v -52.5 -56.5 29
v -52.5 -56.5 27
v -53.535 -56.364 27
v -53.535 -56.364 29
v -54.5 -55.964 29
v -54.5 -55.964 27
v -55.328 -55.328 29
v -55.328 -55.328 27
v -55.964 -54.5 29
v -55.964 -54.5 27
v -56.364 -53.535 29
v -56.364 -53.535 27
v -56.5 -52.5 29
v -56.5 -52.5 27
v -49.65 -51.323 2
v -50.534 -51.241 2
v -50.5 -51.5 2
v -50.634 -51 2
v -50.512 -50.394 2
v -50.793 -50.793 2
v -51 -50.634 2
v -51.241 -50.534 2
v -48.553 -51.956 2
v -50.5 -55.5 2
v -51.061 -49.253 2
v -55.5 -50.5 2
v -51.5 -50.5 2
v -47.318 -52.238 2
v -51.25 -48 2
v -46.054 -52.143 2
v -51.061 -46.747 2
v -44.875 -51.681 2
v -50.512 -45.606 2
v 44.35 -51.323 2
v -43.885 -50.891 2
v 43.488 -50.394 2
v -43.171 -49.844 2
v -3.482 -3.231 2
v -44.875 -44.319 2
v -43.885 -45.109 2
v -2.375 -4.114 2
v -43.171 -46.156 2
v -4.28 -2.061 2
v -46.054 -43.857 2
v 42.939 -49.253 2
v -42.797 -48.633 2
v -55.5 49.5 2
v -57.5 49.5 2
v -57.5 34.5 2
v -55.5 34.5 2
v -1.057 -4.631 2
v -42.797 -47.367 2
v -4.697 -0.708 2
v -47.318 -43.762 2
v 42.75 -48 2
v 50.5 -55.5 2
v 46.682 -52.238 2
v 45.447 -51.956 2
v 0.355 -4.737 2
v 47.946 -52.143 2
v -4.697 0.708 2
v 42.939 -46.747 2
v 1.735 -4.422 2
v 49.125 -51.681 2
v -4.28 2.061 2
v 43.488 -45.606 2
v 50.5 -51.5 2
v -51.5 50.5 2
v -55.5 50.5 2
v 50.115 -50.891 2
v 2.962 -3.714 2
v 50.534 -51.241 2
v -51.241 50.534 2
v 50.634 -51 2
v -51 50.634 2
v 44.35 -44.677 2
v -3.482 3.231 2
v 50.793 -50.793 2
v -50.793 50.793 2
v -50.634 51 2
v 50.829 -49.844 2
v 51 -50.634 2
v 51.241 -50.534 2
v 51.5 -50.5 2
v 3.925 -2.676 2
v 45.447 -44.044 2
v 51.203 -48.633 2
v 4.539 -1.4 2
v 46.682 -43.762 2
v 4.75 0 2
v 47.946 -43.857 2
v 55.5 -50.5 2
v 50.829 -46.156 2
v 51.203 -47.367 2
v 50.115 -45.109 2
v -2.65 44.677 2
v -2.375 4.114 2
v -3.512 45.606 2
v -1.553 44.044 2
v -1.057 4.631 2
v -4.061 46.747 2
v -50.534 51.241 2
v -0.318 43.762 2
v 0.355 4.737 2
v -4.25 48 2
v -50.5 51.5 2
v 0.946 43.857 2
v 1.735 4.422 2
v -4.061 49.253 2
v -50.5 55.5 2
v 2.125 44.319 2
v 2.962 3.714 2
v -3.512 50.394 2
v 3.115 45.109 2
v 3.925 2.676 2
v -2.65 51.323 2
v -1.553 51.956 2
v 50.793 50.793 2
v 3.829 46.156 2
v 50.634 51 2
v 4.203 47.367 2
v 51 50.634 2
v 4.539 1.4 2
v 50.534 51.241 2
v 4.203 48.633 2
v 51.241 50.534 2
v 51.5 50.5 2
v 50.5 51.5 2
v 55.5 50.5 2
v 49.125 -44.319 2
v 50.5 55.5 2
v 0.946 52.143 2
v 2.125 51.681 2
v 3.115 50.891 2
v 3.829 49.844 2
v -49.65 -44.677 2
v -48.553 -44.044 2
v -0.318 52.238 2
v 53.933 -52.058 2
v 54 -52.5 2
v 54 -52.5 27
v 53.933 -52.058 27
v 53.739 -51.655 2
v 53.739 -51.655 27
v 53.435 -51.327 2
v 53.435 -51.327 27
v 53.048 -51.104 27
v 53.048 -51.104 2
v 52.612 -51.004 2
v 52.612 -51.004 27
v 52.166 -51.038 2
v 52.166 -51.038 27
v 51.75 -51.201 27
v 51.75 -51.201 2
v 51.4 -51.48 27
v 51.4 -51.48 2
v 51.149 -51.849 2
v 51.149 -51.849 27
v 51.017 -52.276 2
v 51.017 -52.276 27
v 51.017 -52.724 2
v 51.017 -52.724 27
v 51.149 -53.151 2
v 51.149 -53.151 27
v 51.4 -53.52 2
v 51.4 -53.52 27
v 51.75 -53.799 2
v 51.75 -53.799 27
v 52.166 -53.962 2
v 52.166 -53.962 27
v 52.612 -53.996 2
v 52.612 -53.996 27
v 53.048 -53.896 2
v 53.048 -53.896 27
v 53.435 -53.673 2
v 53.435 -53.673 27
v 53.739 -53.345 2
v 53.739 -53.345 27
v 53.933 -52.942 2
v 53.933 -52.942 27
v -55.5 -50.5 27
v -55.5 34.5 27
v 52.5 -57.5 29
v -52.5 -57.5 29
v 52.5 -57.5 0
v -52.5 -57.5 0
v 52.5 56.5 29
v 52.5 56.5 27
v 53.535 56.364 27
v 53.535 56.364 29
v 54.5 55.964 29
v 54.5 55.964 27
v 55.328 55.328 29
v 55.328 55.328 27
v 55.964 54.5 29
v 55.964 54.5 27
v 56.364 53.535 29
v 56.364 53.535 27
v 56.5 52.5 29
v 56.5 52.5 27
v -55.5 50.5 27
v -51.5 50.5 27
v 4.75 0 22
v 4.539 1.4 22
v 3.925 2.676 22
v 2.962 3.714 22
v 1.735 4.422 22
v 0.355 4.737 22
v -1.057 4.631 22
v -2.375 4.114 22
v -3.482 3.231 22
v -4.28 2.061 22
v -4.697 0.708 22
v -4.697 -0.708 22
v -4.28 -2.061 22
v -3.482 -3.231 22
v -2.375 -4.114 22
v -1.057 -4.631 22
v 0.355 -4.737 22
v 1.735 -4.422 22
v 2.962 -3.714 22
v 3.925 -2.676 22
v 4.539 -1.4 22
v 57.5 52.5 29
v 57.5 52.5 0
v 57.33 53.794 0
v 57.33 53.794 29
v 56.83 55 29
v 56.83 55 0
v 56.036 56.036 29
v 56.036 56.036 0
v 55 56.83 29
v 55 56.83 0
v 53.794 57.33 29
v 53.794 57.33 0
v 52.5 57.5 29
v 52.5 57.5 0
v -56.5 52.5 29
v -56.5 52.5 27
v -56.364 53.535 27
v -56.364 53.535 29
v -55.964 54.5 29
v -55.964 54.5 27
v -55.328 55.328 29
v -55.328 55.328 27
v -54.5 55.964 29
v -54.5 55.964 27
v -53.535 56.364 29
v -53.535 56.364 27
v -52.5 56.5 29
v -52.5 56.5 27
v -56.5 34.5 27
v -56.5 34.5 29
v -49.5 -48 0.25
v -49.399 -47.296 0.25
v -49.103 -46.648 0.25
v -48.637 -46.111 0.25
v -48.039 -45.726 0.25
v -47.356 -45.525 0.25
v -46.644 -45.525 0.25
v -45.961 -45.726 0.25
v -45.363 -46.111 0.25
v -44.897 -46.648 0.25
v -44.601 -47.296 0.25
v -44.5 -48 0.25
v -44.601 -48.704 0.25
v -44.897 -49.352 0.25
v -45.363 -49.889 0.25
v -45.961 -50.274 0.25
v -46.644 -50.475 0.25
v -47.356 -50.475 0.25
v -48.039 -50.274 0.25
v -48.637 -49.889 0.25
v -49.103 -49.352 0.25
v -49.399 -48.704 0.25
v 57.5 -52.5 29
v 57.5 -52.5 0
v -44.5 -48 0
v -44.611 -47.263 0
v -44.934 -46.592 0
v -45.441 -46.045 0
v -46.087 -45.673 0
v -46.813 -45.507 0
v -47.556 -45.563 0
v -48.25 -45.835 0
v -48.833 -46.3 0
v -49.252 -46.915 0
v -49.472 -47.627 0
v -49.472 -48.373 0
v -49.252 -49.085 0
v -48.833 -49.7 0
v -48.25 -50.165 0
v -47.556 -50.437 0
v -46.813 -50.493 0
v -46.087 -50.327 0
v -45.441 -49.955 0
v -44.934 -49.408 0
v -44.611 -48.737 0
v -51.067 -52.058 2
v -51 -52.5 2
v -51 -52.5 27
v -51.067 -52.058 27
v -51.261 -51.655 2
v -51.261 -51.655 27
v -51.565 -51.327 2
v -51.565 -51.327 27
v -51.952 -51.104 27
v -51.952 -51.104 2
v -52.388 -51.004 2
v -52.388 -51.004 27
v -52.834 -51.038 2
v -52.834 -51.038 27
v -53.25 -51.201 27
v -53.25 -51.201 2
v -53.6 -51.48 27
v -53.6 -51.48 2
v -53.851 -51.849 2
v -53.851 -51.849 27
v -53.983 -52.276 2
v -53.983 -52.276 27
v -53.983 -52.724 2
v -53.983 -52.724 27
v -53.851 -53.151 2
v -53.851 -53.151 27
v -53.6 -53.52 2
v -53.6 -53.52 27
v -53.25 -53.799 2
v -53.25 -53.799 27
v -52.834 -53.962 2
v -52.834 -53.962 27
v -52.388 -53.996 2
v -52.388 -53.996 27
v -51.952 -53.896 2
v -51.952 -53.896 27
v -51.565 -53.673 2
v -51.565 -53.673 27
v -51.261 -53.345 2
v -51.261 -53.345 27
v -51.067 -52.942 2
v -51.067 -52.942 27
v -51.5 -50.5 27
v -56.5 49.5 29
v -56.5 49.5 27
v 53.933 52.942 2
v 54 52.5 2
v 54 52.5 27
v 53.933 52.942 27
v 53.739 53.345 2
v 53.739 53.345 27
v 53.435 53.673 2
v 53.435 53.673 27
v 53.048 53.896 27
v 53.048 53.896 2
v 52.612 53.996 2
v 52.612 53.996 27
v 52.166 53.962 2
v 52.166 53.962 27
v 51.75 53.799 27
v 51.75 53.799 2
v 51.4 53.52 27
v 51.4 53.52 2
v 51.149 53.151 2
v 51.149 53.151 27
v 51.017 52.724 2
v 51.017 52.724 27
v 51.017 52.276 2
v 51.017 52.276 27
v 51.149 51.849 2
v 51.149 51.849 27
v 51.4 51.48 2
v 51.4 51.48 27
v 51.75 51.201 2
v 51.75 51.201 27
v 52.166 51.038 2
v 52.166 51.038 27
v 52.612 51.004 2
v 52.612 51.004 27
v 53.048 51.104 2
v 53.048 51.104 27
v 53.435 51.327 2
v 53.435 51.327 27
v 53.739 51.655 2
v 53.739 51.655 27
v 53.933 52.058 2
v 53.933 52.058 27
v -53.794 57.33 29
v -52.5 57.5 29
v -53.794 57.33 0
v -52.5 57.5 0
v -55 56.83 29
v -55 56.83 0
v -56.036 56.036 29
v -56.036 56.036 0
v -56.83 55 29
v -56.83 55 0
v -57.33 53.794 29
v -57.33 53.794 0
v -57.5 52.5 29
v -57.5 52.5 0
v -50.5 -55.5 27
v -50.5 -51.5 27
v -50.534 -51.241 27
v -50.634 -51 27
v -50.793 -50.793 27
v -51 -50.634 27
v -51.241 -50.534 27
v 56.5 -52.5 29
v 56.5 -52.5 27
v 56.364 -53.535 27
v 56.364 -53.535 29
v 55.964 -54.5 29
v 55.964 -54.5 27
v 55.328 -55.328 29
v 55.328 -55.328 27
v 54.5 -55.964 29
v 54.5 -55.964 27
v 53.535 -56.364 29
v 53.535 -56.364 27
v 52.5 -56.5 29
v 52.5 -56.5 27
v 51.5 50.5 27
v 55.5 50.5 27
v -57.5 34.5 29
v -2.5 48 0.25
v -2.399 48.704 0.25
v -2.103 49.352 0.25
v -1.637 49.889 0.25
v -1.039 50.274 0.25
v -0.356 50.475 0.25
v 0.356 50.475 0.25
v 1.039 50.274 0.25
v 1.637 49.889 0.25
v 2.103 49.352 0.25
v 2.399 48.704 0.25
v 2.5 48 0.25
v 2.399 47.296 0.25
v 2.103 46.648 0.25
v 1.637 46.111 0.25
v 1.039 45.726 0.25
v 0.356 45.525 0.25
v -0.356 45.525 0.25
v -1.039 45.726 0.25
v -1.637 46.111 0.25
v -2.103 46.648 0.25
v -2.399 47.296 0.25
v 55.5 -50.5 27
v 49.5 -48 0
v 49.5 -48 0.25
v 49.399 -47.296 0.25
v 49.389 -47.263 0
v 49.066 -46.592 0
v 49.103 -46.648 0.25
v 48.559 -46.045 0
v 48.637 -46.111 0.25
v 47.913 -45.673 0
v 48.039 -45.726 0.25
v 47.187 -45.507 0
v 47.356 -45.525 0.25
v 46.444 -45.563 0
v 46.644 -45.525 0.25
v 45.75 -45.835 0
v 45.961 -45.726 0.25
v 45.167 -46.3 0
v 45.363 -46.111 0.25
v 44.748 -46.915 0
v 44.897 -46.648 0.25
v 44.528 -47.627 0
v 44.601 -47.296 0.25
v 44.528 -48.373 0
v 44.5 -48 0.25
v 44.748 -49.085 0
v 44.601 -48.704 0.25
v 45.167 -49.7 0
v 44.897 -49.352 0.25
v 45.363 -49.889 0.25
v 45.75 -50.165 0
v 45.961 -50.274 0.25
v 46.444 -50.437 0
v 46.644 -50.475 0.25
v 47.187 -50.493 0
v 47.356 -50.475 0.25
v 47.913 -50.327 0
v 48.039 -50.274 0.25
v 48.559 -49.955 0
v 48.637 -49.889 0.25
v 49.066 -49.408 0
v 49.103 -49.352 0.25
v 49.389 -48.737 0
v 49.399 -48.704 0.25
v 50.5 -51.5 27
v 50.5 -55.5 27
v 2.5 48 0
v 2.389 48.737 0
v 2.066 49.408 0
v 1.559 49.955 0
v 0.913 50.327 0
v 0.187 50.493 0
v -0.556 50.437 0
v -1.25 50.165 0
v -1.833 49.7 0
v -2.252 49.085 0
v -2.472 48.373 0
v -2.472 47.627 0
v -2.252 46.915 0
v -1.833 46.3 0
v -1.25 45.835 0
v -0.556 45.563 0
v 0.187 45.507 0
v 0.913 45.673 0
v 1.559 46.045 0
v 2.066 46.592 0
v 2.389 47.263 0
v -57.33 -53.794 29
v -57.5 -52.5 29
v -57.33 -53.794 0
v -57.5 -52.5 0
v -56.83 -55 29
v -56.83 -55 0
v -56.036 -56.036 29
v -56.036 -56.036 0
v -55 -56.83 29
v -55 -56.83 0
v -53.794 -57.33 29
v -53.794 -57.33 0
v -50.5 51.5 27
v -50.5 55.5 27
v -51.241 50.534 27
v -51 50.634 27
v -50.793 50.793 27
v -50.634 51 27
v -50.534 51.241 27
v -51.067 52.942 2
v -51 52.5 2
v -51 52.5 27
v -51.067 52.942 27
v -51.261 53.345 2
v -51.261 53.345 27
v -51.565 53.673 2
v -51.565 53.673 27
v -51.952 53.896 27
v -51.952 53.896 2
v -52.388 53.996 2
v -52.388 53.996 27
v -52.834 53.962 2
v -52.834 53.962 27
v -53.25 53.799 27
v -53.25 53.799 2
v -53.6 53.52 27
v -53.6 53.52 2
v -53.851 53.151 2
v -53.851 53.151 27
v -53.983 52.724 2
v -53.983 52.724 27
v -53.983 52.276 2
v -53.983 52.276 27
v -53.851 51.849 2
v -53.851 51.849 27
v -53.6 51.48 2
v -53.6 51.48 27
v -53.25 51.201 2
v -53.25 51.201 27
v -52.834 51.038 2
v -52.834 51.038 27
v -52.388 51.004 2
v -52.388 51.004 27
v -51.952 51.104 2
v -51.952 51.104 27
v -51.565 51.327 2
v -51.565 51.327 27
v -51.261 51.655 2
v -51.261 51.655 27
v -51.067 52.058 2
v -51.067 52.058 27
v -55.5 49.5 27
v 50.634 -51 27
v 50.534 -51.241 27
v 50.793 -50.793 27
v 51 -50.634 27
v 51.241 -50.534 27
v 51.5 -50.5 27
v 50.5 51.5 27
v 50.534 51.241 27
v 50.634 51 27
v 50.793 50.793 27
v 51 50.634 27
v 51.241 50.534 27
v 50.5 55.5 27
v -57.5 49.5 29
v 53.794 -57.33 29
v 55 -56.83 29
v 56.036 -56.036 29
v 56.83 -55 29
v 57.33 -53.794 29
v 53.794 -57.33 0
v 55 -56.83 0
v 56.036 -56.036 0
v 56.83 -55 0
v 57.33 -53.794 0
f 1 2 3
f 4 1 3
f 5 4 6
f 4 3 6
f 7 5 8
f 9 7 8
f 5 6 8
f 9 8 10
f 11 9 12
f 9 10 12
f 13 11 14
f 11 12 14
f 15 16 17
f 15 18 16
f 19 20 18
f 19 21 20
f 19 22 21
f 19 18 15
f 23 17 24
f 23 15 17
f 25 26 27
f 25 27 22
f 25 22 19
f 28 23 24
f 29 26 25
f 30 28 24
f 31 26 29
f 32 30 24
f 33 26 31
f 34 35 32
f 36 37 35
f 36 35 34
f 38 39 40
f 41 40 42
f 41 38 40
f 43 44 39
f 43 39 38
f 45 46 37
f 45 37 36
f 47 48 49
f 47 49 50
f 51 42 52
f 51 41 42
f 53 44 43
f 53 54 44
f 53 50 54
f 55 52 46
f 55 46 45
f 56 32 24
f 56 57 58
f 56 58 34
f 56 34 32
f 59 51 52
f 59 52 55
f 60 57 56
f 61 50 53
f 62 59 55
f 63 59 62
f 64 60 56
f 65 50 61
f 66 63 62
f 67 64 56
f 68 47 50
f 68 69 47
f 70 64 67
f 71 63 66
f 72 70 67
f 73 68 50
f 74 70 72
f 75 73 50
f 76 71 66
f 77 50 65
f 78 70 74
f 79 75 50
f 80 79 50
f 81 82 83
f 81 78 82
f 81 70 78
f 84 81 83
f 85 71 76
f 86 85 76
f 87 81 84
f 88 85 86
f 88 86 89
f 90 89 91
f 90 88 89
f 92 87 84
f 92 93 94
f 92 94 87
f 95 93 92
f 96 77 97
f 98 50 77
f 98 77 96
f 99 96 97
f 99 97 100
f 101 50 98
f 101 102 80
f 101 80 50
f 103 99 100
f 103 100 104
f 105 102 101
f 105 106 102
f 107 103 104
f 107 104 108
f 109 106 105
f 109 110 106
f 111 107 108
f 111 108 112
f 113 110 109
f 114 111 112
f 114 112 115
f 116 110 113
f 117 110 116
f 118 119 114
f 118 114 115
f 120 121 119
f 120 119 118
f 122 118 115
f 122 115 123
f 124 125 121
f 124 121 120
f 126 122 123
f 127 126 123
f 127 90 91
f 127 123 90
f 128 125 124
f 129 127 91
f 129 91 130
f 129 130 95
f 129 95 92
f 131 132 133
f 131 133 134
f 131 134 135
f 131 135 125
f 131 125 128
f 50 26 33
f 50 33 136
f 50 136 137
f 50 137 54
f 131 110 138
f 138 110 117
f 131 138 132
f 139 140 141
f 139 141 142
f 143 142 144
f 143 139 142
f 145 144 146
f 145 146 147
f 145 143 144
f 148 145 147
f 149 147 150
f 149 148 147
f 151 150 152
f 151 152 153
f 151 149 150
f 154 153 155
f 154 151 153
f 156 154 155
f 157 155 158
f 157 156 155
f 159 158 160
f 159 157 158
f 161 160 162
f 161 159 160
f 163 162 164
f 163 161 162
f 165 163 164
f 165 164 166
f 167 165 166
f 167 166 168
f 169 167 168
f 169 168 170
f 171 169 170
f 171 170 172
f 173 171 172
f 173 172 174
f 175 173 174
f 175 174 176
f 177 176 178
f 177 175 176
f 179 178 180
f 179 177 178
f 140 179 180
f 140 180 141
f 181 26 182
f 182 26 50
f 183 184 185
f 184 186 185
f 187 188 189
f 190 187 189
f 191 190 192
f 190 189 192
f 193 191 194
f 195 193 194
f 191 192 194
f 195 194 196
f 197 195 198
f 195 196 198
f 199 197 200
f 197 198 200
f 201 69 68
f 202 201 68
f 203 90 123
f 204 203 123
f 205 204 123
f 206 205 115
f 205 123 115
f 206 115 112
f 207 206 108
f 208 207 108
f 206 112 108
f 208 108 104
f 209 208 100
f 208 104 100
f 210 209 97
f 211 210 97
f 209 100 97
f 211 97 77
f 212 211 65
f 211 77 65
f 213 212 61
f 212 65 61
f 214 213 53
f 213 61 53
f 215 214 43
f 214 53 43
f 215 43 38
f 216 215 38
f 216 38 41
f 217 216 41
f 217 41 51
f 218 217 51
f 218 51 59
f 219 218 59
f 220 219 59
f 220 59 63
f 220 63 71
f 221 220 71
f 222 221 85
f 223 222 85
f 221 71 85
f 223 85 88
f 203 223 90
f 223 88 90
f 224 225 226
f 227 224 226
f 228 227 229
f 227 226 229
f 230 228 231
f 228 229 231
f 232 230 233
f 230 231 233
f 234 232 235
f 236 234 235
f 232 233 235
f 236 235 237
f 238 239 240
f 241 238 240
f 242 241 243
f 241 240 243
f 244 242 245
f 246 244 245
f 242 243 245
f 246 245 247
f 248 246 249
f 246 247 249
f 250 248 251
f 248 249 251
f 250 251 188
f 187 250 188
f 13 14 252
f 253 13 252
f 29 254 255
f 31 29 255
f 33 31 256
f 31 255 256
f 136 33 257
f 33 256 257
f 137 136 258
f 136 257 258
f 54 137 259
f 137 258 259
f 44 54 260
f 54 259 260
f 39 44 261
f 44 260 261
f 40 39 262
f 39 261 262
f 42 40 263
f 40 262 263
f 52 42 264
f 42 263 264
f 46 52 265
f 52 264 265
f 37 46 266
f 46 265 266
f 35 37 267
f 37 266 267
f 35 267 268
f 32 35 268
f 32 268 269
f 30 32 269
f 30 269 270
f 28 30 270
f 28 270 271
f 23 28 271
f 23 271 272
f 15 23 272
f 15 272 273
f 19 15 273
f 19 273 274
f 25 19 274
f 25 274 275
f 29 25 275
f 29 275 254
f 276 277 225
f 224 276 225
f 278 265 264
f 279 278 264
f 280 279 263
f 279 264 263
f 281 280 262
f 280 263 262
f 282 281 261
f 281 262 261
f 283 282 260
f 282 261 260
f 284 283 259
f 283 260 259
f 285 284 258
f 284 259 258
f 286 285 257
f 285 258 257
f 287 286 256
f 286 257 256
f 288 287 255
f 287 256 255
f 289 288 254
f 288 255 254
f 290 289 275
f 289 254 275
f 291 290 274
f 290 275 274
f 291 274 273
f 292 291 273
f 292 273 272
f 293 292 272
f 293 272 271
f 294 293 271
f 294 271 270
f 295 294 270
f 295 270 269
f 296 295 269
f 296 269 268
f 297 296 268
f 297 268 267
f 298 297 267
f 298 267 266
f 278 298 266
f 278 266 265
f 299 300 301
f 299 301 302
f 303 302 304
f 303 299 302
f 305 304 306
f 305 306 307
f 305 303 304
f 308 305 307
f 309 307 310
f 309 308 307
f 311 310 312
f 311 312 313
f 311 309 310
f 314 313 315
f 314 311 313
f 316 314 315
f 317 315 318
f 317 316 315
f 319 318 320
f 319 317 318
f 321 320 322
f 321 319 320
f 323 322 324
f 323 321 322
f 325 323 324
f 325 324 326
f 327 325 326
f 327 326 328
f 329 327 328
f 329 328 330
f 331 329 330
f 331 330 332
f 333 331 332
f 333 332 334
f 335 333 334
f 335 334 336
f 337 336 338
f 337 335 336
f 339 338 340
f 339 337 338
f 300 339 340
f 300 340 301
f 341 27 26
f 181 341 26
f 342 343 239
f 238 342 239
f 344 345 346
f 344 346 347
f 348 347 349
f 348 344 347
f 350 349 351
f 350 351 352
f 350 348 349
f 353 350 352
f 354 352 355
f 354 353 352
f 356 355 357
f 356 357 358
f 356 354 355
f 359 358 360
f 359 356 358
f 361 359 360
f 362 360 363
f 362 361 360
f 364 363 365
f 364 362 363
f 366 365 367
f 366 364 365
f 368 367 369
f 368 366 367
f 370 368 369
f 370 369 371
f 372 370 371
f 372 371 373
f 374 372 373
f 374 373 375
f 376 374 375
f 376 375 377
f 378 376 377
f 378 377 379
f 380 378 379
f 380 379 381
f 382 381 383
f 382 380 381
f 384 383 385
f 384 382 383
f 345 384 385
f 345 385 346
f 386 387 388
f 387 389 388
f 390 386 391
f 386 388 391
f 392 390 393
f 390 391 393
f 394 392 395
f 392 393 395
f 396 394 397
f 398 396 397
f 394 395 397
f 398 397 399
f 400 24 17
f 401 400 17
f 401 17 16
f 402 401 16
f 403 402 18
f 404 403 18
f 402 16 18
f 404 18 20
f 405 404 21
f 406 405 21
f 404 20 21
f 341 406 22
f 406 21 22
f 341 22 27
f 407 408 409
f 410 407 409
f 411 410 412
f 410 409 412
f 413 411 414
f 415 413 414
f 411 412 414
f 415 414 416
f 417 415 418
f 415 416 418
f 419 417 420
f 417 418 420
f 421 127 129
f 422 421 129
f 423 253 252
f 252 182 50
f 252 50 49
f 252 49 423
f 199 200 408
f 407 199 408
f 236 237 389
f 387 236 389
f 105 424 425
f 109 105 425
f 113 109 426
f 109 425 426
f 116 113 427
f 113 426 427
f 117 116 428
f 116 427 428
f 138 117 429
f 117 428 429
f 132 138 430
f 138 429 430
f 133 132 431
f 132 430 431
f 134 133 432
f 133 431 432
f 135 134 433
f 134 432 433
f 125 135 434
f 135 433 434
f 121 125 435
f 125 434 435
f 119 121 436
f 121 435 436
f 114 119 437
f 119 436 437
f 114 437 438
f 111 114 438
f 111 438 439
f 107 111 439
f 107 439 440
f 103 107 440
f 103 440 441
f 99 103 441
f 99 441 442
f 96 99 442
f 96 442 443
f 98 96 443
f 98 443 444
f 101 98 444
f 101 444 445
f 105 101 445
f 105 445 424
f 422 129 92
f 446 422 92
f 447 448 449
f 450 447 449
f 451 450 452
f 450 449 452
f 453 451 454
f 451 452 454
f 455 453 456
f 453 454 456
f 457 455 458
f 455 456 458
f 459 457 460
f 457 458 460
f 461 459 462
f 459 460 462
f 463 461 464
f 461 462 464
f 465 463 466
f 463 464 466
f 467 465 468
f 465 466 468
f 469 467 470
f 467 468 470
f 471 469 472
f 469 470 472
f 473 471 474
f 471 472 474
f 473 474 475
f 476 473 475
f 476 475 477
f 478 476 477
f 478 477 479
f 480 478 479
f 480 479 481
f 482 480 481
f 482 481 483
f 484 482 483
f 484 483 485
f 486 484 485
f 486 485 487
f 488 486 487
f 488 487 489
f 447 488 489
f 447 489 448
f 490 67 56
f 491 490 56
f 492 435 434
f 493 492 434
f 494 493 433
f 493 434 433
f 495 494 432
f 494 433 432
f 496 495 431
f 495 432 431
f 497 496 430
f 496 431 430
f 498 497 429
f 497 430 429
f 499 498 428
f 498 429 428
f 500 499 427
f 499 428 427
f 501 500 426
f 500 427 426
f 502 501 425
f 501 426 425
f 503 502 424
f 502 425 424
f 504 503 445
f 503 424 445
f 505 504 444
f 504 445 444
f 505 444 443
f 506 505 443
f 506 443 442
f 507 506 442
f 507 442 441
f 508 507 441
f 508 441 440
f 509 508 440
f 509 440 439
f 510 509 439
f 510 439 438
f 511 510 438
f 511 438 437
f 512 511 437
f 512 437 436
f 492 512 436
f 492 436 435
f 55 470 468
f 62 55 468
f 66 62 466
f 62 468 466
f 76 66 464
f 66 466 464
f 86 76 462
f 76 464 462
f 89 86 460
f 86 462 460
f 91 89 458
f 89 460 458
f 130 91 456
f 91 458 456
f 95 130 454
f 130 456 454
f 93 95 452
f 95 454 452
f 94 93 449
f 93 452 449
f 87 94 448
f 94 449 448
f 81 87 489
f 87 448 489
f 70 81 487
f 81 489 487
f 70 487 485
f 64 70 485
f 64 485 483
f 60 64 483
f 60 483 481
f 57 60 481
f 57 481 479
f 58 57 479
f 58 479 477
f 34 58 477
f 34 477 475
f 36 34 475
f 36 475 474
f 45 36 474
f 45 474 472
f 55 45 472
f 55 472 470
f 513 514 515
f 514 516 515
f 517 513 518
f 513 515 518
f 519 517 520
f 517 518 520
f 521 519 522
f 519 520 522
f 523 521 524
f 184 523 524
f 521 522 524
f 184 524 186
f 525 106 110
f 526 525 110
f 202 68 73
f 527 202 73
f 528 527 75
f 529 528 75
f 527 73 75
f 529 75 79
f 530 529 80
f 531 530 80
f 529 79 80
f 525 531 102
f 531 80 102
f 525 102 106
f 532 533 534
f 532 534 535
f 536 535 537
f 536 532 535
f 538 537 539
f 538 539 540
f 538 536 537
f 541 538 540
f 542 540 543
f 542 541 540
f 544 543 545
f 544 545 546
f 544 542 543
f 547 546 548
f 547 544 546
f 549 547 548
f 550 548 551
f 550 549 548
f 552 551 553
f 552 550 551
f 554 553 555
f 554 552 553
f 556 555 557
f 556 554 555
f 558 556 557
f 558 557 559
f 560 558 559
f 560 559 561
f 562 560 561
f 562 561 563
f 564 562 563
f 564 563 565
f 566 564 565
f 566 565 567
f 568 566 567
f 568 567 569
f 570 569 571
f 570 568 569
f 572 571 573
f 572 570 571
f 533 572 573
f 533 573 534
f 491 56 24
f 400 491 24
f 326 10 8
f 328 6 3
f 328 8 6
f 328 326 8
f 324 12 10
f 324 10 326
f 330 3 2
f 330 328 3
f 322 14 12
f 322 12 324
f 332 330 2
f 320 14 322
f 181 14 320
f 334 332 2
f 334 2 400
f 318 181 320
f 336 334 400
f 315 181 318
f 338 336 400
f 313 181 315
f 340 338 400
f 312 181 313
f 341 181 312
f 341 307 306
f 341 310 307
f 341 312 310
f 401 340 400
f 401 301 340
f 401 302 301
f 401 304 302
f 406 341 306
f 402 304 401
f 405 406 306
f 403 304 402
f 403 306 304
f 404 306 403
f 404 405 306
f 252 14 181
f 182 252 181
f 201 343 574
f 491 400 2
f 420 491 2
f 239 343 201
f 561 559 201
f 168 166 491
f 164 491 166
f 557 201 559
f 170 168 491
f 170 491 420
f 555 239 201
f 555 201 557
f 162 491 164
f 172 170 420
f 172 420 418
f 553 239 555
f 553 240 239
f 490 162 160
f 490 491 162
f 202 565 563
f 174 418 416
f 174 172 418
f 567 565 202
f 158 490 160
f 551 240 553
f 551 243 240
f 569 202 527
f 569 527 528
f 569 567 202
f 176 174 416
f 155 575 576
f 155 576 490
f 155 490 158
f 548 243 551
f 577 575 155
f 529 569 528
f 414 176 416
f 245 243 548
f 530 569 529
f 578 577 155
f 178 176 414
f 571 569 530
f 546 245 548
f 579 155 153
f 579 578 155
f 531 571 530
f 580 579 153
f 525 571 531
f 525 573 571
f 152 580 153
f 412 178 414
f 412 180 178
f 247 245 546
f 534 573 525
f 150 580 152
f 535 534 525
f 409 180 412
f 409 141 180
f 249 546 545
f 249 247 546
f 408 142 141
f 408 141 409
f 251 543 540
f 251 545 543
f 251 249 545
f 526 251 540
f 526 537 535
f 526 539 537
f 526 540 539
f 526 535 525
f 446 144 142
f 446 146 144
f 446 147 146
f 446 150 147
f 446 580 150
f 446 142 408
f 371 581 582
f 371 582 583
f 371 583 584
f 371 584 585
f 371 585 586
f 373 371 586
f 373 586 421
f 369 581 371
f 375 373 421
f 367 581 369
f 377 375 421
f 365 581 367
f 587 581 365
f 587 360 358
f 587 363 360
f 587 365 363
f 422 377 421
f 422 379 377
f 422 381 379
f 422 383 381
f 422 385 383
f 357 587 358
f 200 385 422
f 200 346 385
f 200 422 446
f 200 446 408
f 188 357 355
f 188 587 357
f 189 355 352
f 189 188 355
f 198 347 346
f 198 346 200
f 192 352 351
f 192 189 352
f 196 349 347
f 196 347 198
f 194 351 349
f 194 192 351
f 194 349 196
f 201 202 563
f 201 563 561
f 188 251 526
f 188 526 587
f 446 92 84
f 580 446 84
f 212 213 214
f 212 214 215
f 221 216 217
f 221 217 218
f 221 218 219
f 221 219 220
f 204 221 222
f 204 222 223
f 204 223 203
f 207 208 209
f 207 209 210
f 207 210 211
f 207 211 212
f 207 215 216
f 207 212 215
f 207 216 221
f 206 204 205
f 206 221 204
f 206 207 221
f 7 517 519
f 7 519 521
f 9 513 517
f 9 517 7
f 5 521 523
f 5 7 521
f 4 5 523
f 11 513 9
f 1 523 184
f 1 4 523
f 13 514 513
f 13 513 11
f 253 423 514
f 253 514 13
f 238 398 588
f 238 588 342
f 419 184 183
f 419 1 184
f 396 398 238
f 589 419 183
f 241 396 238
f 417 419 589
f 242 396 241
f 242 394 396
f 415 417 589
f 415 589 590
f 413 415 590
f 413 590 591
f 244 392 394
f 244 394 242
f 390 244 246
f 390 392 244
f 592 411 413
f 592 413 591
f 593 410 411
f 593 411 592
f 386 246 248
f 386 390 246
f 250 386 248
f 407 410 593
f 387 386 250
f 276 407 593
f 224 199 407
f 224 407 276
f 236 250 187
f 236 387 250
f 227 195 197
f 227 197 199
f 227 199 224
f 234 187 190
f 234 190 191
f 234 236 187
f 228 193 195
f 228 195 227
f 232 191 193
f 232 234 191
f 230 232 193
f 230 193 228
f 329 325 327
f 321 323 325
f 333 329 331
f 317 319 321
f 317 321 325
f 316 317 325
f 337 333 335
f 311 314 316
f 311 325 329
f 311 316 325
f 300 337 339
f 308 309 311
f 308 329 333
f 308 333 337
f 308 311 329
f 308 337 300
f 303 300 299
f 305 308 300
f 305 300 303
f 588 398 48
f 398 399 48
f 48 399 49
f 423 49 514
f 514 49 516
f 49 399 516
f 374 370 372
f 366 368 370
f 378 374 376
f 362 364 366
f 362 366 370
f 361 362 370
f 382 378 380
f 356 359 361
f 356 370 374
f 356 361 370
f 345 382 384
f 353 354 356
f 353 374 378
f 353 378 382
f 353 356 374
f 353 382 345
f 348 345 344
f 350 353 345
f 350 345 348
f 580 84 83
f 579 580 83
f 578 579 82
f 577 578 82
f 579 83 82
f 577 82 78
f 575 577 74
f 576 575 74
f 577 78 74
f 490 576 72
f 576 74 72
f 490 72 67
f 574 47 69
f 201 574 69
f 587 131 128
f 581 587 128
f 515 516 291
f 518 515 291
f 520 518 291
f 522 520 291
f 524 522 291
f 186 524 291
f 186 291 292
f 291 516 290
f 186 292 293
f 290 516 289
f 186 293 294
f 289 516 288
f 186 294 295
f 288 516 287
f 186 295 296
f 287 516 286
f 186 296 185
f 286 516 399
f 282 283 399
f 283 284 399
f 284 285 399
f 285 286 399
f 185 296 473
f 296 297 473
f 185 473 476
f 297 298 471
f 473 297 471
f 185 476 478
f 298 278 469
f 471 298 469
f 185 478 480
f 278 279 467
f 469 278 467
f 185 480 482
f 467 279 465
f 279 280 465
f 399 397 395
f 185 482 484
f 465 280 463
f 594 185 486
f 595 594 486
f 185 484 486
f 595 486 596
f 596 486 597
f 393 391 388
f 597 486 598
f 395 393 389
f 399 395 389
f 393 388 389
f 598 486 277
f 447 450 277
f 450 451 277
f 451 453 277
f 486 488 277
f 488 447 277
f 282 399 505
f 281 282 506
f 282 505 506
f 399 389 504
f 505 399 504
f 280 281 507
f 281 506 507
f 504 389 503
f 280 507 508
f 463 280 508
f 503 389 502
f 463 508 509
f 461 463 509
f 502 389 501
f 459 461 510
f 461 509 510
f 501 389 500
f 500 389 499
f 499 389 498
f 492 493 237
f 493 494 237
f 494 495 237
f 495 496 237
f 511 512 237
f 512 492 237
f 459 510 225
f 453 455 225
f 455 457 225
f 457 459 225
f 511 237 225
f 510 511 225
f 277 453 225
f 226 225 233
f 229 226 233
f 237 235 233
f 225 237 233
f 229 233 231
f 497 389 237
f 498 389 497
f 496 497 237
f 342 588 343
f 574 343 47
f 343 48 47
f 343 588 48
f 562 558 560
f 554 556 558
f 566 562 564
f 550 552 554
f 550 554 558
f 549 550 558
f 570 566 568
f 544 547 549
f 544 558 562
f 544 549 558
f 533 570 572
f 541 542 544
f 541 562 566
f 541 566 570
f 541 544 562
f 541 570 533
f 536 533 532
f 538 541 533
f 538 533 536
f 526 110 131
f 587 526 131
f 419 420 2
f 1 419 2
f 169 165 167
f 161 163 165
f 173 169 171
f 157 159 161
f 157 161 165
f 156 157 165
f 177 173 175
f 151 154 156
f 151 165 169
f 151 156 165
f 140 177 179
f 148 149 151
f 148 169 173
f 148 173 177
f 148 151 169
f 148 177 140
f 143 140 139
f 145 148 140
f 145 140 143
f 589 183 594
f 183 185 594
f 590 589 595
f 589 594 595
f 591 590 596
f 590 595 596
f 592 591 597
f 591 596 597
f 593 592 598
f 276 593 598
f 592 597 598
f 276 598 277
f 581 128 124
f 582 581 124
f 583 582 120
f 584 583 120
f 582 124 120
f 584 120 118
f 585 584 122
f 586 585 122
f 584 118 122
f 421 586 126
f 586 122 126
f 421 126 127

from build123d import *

# Parameters (mm, degrees)
F1_DEPTH        = 2
F2_R            = 4.75
F3_DEPTH        = 20
F2_R_2          = 2.5
F4_DEPTH        = 2
F2_R_3          = 1.5
F5_DEPTH        = 25
F7_DEPTH        = 2
F8_D            = 5
F8_CSINK_D      = 8.5
F8_CSINK_ANGLE  = 90
F9_D            = 5
F9_CSINK_D      = 8.5
F9_CSINK_ANGLE  = 90
F10_D           = 5
F10_CSINK_D     = 8.5
F10_CSINK_ANGLE = 90


with BuildPart() as f1:
    # F0 (on Top) → F1 (new body)
    with BuildSketch(Plane.XY):
        with BuildLine():
            ThreePointArc((-57.5, -52.5), (-56.035534, -56.035534), (-52.5, -57.5))
            Line((-52.5, -57.5), (52.5, -57.5))
            ThreePointArc((52.5, -57.5), (56.035534, -56.035534), (57.5, -52.5))
            Line((57.5, -52.5), (57.5, 52.5))
            ThreePointArc((57.5, 52.5), (56.035534, 56.035534), (52.5, 57.5))
            Line((52.5, 57.5), (-52.5, 57.5))
            ThreePointArc((-52.5, 57.5), (-56.035534, 56.035534), (-57.5, 52.5))
            Line((-57.5, 52.5), (-57.5, -52.5))
        make_face()
    extrude(amount=F1_DEPTH)

    # F2 (on face) → F3 (join)
    with BuildSketch(Plane.XY.offset(2)):
        Circle(F2_R)
    extrude(amount=F3_DEPTH)

    # F2 (on face) → F4 (cut)
    with BuildSketch(Plane.XY.offset(2)):
        with Locations((47, -48)):
            Circle(F2_R_2)
        with Locations((0, 48)):
            Circle(F2_R_2)
        with Locations((-47, -48)):
            Circle(F2_R_2)
    extrude(amount=-F4_DEPTH, mode=Mode.SUBTRACT)

    # F2 (on face) → F5 (join)
    with BuildSketch(Plane.XY.offset(2)):
        with BuildLine():
            Line((-55.5, 49.5), (-55.5, 50.5))
            Line((-55.5, 50.5), (-51.5, 50.5))
            ThreePointArc((-51.5, 50.5), (-50.792893, 50.792893), (-50.5, 51.5))
            Line((-50.5, 51.5), (-50.5, 55.5))
            Line((-50.5, 55.5), (50.5, 55.5))
            Line((50.5, 55.5), (50.5, 51.5))
            ThreePointArc((50.5, 51.5), (50.792893, 50.792893), (51.5, 50.5))
            Line((51.5, 50.5), (55.5, 50.5))
            Line((55.5, 50.5), (55.5, -50.5))
            Line((55.5, -50.5), (51.5, -50.5))
            ThreePointArc((51.5, -50.5), (50.792893, -50.792893), (50.5, -51.5))
            Line((50.5, -51.5), (50.5, -55.5))
            Line((50.5, -55.5), (-50.5, -55.5))
            Line((-50.5, -55.5), (-50.5, -51.5))
            ThreePointArc((-50.5, -51.5), (-50.792893, -50.792893), (-51.5, -50.5))
            Line((-51.5, -50.5), (-55.5, -50.5))
            Line((-55.5, -50.5), (-55.5, 34.5))
            Line((-55.5, 34.5), (-57.5, 34.5))
            Line((-57.5, 34.5), (-57.5, -52.5))
            ThreePointArc((-57.5, -52.5), (-56.035534, -56.035534), (-52.5, -57.5))
            Line((-52.5, -57.5), (52.5, -57.5))
            ThreePointArc((52.5, -57.5), (56.035534, -56.035534), (57.5, -52.5))
            Line((57.5, -52.5), (57.5, 52.5))
            ThreePointArc((57.5, 52.5), (56.035534, 56.035534), (52.5, 57.5))
            Line((52.5, 57.5), (-52.5, 57.5))
            ThreePointArc((-52.5, 57.5), (-56.035534, 56.035534), (-57.5, 52.5))
            Line((-57.5, 52.5), (-57.5, 49.5))
            Line((-57.5, 49.5), (-55.5, 49.5))
        make_face()
        with Locations((-52.5, -52.5)):
            Circle(F2_R_3, mode=Mode.SUBTRACT)
        with Locations((52.5, -52.5)):
            Circle(F2_R_3, mode=Mode.SUBTRACT)
        with Locations((-52.5, 52.5)):
            Circle(F2_R_3, mode=Mode.SUBTRACT)
        with Locations((52.5, 52.5)):
            Circle(F2_R_3, mode=Mode.SUBTRACT)
    extrude(amount=F5_DEPTH)

    # F6 (on face) → F7 (join)
    with BuildSketch(Plane.XY.offset(27)):
        with BuildLine():
            Line((52.5, 57.5), (-52.5, 57.5))
            ThreePointArc((-52.5, 57.5), (-56.035534, 56.035534), (-57.5, 52.5))
            Line((-57.5, 52.5), (-57.5, 49.5))
            Line((-57.5, 49.5), (-56.5, 49.5))
            Line((-56.5, 49.5), (-56.5, 52.5))
            ThreePointArc((-56.5, 52.5), (-55.328427, 55.328427), (-52.5, 56.5))
            Line((-52.5, 56.5), (52.5, 56.5))
            ThreePointArc((52.5, 56.5), (55.328427, 55.328427), (56.5, 52.5))
            Line((56.5, 52.5), (56.5, -52.5))
            ThreePointArc((56.5, -52.5), (55.328427, -55.328427), (52.5, -56.5))
            Line((52.5, -56.5), (-52.5, -56.5))
            ThreePointArc((-52.5, -56.5), (-55.328427, -55.328427), (-56.5, -52.5))
            Line((-56.5, -52.5), (-56.5, 34.5))
            Line((-56.5, 34.5), (-57.5, 34.5))
            Line((-57.5, 34.5), (-57.5, -52.5))
            ThreePointArc((-57.5, -52.5), (-56.035534, -56.035534), (-52.5, -57.5))
            Line((-52.5, -57.5), (52.5, -57.5))
            ThreePointArc((52.5, -57.5), (56.035534, -56.035534), (57.5, -52.5))
            Line((57.5, -52.5), (57.5, 52.5))
            ThreePointArc((57.5, 52.5), (56.035534, 56.035534), (52.5, 57.5))
        make_face()
    extrude(amount=F7_DEPTH)

    # F8 (through all)
    with Locations(Plane.XY.offset(2)):
        with Locations((0, 48)):
            CounterSinkHole(F8_D / 2, F8_CSINK_D / 2, counter_sink_angle=F8_CSINK_ANGLE)

    # F9 (through all)
    with Locations(Plane.XY.offset(2)):
        with Locations((47, -48)):
            CounterSinkHole(F9_D / 2, F9_CSINK_D / 2, counter_sink_angle=F9_CSINK_ANGLE)

    # F10 (through all)
    with Locations(Plane.XY.offset(2)):
        with Locations((-47, -48)):
            CounterSinkHole(F10_D / 2, F10_CSINK_D / 2, counter_sink_angle=F10_CSINK_ANGLE)


solid = f1.part
